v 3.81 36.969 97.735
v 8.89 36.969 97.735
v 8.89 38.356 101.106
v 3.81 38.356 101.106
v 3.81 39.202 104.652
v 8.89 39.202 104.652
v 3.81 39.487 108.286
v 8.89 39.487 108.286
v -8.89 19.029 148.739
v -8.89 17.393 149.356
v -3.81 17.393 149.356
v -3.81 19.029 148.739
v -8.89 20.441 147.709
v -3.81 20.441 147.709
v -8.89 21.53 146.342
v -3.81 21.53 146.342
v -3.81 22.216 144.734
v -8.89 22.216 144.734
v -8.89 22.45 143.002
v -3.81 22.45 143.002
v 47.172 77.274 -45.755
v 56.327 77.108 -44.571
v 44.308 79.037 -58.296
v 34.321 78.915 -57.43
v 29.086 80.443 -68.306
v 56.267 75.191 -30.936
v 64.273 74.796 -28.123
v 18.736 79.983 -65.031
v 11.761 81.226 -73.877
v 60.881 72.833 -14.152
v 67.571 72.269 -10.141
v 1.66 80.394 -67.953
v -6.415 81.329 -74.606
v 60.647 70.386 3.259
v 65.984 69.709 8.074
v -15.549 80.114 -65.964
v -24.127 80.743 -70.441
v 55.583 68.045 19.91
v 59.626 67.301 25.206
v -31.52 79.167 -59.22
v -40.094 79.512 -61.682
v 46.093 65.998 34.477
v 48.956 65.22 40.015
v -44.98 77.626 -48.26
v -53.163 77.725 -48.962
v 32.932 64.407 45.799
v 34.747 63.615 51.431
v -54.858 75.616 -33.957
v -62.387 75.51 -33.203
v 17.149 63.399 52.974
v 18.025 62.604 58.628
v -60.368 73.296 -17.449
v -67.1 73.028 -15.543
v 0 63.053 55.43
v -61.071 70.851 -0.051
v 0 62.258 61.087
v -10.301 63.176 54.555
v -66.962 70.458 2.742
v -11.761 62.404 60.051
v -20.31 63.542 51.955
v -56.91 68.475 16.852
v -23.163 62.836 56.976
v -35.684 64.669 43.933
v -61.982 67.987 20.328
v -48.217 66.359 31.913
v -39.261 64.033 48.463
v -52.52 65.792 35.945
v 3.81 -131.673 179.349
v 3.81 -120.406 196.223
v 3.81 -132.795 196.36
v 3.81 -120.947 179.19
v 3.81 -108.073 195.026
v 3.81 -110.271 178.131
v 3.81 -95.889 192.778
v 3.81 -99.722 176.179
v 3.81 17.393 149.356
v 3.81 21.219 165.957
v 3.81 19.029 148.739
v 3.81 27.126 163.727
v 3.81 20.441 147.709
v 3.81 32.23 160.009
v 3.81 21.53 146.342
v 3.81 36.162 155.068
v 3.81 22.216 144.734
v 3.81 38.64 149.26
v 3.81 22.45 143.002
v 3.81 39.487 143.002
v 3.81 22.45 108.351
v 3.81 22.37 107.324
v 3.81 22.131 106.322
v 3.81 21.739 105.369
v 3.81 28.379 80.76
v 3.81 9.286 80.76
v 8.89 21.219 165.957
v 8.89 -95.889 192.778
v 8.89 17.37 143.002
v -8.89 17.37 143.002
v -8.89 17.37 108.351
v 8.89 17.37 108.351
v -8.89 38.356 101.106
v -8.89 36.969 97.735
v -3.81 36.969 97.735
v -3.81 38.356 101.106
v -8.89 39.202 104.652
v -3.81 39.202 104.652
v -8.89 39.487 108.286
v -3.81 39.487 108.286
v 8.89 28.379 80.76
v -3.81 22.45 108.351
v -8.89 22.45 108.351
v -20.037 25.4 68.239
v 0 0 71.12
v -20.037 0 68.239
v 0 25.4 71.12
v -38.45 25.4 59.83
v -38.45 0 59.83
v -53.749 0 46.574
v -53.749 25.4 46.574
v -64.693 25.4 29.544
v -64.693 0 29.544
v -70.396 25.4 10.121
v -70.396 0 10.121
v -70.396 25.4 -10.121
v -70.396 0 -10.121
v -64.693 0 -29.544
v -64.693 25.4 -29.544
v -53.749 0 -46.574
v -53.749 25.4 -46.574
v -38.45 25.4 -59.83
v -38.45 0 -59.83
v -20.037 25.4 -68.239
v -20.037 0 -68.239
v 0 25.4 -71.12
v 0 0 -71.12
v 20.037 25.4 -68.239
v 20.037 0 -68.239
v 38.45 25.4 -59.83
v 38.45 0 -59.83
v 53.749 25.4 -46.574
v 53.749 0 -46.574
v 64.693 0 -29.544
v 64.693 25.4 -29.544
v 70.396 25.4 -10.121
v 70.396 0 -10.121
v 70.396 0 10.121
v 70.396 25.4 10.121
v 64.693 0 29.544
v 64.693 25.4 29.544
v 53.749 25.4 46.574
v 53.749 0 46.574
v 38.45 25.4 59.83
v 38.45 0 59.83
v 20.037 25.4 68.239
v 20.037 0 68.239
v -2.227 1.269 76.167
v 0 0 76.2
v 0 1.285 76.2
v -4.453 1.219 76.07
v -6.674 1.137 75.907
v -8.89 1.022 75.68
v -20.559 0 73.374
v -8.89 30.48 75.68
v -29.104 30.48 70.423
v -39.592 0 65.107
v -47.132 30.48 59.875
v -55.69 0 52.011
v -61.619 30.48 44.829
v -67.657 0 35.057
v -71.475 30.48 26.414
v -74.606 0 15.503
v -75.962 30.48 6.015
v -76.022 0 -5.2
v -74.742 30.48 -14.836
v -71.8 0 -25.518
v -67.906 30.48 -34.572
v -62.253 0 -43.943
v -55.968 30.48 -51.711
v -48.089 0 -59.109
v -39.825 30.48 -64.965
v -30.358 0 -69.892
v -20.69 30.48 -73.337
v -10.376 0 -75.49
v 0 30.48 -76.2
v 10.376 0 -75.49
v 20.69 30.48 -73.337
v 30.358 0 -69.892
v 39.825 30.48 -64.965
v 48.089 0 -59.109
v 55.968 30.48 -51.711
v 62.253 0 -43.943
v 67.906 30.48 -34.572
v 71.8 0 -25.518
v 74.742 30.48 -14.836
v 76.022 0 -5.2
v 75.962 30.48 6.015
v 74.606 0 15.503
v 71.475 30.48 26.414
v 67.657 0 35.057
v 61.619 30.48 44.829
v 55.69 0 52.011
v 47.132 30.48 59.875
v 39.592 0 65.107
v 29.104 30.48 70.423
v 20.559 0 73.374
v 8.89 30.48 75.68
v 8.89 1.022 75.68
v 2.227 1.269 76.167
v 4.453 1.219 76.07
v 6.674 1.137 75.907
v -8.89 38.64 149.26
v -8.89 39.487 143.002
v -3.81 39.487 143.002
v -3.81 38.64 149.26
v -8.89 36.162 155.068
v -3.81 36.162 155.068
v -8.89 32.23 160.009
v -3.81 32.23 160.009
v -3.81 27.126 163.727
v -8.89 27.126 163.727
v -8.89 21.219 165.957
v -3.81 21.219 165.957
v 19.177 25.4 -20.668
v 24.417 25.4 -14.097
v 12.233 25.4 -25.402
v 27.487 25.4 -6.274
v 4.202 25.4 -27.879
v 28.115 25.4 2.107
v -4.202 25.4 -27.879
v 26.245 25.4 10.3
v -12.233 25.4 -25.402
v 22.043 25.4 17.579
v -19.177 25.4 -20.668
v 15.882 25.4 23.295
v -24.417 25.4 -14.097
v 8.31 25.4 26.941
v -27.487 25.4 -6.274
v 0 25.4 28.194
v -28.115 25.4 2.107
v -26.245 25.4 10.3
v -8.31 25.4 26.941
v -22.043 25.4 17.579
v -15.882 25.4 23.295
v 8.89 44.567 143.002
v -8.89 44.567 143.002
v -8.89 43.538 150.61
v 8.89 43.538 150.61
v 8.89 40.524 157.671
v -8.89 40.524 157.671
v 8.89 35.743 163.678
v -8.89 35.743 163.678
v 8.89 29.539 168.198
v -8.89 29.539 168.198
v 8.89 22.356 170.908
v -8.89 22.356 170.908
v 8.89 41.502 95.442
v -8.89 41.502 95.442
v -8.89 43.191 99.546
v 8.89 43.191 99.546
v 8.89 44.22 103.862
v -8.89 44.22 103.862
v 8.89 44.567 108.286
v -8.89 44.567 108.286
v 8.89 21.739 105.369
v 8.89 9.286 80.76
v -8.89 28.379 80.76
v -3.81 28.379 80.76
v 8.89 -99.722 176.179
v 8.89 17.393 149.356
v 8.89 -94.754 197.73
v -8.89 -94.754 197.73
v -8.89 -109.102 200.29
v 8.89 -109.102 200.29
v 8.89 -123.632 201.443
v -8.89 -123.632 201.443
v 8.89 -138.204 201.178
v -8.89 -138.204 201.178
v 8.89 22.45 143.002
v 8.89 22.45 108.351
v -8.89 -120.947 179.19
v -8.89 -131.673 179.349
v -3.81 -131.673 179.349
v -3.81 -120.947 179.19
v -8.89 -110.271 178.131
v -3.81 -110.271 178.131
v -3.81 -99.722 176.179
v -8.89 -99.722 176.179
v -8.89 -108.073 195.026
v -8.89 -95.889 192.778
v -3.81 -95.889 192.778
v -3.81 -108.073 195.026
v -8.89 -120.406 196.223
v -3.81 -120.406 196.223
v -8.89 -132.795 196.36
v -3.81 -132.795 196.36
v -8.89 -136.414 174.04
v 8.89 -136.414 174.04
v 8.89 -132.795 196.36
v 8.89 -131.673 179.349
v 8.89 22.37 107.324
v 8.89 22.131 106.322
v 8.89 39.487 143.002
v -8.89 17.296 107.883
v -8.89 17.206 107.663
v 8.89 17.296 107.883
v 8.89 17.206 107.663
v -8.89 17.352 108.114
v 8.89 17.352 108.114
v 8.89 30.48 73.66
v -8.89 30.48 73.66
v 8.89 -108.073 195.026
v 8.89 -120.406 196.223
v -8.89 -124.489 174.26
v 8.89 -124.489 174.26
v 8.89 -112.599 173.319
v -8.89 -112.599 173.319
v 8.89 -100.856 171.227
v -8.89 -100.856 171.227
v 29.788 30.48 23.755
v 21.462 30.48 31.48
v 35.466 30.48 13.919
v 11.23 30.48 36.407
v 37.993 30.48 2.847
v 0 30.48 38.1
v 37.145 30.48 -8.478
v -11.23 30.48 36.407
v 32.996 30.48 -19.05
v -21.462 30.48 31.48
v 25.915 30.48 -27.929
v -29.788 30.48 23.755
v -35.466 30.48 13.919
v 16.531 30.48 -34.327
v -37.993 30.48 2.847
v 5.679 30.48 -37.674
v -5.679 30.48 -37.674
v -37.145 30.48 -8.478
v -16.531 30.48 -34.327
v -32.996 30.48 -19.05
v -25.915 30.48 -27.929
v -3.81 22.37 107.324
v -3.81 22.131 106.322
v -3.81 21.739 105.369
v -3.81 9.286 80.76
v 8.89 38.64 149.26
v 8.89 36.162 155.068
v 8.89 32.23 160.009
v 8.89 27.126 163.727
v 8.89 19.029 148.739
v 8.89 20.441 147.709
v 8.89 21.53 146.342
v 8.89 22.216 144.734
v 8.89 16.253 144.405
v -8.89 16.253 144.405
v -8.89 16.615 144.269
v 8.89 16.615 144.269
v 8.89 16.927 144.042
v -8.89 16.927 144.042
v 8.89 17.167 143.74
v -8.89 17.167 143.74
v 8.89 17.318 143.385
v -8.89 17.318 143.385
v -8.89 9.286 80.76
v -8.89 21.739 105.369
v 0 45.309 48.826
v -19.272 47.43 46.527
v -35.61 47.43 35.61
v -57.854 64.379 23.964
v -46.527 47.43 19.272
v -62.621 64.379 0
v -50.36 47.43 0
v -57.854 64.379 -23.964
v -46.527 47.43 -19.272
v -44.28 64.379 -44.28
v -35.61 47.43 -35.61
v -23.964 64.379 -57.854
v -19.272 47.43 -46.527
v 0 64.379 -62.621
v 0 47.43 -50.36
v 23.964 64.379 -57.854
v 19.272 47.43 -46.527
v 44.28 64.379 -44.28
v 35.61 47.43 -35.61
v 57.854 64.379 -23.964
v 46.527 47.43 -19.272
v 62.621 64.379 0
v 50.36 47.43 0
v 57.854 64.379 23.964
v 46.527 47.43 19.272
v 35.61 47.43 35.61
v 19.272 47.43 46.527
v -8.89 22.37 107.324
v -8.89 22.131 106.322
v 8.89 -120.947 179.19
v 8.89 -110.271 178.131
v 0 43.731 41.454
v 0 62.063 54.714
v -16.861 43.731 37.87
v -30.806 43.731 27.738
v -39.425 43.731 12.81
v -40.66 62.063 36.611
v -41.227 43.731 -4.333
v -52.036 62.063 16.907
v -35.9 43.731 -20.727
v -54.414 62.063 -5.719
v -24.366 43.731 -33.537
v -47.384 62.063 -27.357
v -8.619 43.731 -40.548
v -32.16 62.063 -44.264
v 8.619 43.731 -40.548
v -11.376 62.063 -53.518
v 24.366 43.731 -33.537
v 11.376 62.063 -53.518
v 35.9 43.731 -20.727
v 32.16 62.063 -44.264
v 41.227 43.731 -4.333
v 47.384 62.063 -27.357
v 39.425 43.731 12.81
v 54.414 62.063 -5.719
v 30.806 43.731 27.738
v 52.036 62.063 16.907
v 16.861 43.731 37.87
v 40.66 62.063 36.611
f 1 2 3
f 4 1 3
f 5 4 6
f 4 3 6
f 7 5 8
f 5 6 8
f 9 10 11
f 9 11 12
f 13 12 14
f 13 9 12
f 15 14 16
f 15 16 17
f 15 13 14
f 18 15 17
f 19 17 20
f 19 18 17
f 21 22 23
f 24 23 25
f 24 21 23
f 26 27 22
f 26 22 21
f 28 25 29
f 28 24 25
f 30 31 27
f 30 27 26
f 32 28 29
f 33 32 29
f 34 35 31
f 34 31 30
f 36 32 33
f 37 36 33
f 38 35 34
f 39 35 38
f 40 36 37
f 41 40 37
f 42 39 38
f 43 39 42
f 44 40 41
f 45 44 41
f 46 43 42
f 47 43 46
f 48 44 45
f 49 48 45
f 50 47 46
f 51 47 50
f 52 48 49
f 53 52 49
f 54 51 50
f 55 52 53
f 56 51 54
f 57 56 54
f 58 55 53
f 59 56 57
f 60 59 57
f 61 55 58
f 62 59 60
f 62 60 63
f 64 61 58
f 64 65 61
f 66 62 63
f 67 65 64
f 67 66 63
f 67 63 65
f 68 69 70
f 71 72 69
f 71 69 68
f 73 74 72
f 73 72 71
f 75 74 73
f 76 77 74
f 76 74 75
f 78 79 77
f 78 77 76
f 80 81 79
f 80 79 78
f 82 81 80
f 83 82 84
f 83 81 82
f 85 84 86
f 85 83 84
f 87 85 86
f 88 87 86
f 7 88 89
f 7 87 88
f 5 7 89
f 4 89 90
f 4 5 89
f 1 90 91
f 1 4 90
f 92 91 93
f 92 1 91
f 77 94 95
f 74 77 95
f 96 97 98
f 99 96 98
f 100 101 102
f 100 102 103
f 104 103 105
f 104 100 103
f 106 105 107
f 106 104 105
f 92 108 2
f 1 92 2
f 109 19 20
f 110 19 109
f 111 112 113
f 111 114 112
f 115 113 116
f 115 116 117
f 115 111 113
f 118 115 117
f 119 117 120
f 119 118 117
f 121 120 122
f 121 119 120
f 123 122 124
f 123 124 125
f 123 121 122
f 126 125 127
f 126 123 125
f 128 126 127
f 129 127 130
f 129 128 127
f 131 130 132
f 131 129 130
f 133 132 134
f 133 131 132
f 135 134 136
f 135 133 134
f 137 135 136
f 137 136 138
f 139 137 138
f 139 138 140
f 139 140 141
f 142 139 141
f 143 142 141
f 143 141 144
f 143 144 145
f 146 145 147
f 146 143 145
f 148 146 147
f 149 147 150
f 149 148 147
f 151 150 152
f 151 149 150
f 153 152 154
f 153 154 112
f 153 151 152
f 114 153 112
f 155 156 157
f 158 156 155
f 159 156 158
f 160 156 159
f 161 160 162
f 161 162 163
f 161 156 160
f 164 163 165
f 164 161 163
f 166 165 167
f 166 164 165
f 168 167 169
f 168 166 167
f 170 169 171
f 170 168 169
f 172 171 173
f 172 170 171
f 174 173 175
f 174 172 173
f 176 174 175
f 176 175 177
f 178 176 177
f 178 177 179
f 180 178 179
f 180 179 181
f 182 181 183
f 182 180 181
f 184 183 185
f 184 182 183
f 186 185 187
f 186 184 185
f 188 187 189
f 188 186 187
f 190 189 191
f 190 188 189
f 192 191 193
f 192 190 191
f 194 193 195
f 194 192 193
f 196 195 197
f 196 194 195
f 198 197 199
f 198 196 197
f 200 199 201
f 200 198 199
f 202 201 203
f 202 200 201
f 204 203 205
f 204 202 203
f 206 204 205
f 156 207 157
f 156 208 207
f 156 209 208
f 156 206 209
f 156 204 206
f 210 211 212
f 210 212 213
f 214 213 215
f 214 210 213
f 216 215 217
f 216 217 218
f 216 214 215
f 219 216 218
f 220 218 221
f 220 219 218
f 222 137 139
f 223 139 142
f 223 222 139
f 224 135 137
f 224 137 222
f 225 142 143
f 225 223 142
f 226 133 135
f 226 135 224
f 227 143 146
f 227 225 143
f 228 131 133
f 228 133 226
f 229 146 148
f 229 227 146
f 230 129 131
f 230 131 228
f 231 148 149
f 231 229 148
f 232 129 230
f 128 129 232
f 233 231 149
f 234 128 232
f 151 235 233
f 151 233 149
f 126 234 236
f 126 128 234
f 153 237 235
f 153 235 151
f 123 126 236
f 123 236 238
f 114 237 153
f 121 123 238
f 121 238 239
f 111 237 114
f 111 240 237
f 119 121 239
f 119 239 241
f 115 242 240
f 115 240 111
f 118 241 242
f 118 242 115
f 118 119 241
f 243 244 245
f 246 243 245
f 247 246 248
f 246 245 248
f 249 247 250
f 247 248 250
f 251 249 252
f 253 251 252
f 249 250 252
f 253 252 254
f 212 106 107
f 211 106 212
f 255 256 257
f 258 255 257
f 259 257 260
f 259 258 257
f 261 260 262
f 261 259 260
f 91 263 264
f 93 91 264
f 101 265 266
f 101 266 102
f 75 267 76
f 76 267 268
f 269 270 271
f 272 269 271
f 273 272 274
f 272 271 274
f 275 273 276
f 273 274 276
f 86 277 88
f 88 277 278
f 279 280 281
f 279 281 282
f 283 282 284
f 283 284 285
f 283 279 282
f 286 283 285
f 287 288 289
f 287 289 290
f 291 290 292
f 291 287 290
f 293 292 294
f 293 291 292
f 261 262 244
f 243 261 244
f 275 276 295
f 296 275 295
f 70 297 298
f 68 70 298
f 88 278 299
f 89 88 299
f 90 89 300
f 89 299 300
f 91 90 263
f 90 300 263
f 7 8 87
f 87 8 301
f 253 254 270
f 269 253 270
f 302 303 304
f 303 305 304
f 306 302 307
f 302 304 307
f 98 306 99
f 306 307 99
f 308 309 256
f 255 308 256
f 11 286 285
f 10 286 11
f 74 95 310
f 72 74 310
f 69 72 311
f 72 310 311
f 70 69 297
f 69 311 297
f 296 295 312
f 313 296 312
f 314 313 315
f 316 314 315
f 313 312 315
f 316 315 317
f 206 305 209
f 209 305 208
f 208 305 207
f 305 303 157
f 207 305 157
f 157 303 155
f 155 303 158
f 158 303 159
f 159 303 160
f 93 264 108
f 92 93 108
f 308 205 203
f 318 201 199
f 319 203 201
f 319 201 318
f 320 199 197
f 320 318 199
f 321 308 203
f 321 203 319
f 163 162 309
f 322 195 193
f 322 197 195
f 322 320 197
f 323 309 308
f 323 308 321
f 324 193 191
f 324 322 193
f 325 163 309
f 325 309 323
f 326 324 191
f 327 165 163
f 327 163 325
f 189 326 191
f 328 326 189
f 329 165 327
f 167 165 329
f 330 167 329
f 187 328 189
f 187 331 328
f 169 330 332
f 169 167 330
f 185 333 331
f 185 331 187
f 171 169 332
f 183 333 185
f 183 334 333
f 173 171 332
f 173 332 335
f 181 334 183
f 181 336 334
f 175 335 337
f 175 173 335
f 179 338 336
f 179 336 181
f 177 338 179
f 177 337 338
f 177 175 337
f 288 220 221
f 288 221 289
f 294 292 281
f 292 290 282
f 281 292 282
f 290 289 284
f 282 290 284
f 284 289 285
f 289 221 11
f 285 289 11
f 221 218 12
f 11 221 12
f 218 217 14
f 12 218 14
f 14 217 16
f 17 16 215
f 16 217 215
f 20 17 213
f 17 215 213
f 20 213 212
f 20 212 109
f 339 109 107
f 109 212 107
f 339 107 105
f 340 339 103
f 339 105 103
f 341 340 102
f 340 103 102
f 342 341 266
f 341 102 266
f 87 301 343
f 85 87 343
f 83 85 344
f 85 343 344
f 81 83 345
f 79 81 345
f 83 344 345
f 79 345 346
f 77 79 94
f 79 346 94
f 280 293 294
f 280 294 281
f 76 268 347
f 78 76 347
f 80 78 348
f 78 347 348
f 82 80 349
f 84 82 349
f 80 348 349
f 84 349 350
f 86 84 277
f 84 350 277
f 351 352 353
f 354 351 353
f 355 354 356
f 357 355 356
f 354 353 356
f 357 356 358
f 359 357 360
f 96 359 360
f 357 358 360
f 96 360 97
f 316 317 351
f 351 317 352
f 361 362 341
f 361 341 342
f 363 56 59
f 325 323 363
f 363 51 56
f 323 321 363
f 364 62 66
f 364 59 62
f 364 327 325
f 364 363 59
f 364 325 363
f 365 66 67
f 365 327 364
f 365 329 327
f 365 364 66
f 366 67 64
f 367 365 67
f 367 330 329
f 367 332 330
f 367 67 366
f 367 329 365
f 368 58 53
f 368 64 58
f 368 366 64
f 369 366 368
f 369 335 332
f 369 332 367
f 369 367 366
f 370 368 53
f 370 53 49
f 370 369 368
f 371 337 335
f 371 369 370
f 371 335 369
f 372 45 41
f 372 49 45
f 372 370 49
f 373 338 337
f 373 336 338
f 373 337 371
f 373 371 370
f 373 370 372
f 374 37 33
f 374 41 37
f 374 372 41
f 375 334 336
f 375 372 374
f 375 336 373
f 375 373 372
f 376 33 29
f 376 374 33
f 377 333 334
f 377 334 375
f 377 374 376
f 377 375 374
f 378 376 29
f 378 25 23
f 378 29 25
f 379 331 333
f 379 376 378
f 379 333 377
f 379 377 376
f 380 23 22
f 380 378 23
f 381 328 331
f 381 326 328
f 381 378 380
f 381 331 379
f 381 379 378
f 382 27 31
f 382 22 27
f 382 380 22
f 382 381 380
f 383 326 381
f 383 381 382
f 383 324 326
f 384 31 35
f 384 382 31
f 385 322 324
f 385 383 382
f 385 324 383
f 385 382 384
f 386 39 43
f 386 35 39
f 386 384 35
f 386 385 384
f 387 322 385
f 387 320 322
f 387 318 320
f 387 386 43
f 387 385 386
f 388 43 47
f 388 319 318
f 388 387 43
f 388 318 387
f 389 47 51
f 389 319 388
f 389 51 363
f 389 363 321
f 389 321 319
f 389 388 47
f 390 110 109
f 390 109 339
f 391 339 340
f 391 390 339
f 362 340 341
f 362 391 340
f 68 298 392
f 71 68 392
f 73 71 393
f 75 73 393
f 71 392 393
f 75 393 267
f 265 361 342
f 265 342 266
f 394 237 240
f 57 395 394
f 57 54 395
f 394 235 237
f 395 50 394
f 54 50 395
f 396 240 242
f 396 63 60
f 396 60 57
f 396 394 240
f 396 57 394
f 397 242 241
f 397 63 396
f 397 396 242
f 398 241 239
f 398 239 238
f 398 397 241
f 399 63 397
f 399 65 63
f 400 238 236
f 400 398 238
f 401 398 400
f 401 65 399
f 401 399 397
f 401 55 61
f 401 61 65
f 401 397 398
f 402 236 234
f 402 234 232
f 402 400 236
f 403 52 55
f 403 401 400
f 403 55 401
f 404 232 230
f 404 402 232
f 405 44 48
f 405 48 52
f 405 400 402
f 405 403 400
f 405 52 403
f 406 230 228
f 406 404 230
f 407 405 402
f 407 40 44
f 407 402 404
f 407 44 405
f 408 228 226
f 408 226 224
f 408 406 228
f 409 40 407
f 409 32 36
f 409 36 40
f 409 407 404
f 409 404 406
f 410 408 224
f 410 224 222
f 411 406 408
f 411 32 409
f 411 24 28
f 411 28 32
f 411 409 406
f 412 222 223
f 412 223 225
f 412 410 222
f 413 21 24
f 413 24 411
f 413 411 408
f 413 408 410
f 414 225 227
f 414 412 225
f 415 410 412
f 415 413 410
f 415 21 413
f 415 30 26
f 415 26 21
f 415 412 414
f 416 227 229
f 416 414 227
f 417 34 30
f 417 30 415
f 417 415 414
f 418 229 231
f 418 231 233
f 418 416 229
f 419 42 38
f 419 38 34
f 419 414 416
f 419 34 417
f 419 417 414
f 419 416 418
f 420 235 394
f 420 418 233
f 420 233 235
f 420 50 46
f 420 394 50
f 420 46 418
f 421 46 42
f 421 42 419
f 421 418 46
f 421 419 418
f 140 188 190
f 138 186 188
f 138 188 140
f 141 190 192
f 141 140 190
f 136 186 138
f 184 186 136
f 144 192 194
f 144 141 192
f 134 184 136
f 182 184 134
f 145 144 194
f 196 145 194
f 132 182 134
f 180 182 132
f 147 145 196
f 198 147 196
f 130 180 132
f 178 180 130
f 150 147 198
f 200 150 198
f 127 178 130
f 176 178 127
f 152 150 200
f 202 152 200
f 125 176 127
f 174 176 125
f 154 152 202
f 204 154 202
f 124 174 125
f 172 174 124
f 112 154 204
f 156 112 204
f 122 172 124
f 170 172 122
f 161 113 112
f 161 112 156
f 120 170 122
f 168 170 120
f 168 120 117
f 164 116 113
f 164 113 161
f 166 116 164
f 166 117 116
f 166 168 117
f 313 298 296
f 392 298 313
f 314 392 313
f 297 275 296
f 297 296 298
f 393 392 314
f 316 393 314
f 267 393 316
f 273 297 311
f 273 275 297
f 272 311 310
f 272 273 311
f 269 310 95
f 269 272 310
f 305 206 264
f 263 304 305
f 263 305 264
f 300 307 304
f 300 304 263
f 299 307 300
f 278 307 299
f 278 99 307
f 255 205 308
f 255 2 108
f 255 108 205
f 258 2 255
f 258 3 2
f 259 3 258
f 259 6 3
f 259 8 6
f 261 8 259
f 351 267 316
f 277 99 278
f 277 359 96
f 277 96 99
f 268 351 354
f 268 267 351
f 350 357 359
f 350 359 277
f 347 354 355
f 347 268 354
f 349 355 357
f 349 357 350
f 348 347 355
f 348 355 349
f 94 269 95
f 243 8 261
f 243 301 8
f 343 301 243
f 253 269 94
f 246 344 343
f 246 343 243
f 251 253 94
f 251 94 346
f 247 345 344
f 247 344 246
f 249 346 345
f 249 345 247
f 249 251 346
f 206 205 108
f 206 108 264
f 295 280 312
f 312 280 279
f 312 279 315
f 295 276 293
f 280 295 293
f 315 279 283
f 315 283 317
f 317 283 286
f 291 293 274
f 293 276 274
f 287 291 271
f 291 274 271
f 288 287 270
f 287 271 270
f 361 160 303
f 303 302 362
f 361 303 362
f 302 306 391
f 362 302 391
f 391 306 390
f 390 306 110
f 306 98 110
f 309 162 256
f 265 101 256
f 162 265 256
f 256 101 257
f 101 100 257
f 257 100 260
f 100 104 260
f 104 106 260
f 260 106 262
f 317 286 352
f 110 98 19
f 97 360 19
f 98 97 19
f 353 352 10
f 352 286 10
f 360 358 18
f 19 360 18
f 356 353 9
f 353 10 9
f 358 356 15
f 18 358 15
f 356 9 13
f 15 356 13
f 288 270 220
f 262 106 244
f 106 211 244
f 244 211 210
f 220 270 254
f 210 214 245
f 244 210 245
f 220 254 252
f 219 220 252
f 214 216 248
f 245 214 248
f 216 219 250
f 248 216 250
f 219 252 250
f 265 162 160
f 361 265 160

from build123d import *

# Parameters (mm, degrees)
SWEEP2_START       = -8.89
SWEEP2_DEPTH       = 17.78
FILLET1_R          = 28.448
FILLET2_R          = 1.524
CUT_EXTRUDE1_DEPTH = 5.08


with BuildPart() as part:
    # Sketch1 → Revolve1 (revolve)
    with BuildSketch(Plane.XY, mode=Mode.PRIVATE) as revolve1_sk:
        Polygon((71.12, 25.4), (28.194, 25.4), (68.685755738, 81.378294554), (75.018953762, 81.51903327), (38.1, 30.48), (76.2, 30.48), (76.2, 0), (71.12, 0), align=None)
    revolve(revolve1_sk.sketch.rotate(Axis((0, 85.716301318, 0), (0, -1, 0)), 90), axis=Axis((0, 85.716301318, 0), (0, -1, 0)))

    # SurfaceCut1
    split(bisect_by=Plane(origin=(0, 69.471471591, 9.763578605), x_dir=(-1, 0, 0), z_dir=(0, 0.9902680687415703, 0.13917310096006574)), keep=Keep.BOTTOM)

    # Sweep2: read off the stored shape, not the designer's step
    # Sweep2 outline → Sweep2 (add)
    with BuildSketch(Plane.YZ.offset(SWEEP2_START)):
        with BuildLine():
            Line((17.370160471, 143.002), (17.370160471, 107.987503449))
            Line((17.370160471, 107.987503449), (1.021963911, 75.67963993))
            Line((1.021963911, 75.67963993), (30.48, 75.67963993))
            Line((30.48, 75.67963993), (30.48, 73.66))
            Line((30.48, 73.66), (44.566575341, 101.498370543))
            Line((44.566575341, 101.498370543), (44.566575341, 143.002))
            ThreePointArc((44.566575341, 143.002), (38.336028216, 160.835083682), (22.355619148, 170.908073165))
            Line((22.355619148, 170.908073165), (-94.754140244, 197.729788602))
            ThreePointArc((-94.754140244, 197.729788602), (-116.352888931, 201.043440298), (-138.203933305, 201.177947268))
            Line((-138.203933305, 201.177947268), (-136.414333354, 174.040476608))
            ThreePointArc((-136.414333354, 174.040476608), (-118.532403269, 173.934498987), (-100.856344498, 171.226806034))
            Line((-100.856344498, 171.226806034), (16.253414894, 144.405090597))
            ThreePointArc((16.253414894, 144.405090597), (17.056894537, 143.898630346), (17.370160471, 143.002))
        make_face()
    extrude(amount=SWEEP2_DEPTH)

    # Fillet1
    fillet1_edges = [part.edges().sort_by_distance(p)[0] for p in [
        (0, 44.566575341, 101.498370543),
    ]]
    fillet(fillet1_edges, radius=FILLET1_R)

    # Fillet2
    fillet2_edges = [part.edges().sort_by_distance(p)[0] for p in [
        (0, 17.370160471, 107.987503449),
    ]]
    fillet(fillet2_edges, radius=FILLET2_R)

    # Sketch7 → Cut-Extrude1 (cut)
    with BuildSketch(Plane(origin=(8.89, 0, 0), x_dir=(0, 0, -1), z_dir=(1, 0, 0))):
        with BuildLine():
            Line((-80.75963993, 9.28584823), (-80.75963993, 28.379170924))
            Line((-80.75963993, 28.379170924), (-97.73546941, 36.969160074))
            ThreePointArc((-97.73546941, 36.969160074), (-102.862715222, 38.848510317), (-108.286134805, 39.486575341))
            Line((-108.286134805, 39.486575341), (-143.002, 39.486575341))
            ThreePointArc((-143.002, 39.486575341), (-157.670443725, 34.362181678), (-165.956972893, 21.218510727))
            Line((-165.956972893, 21.218510727), (-192.778140508, -95.888856575))
            ThreePointArc((-192.778140508, -95.888856575), (-195.756406443, -114.226762874), (-196.359610136, -132.795150546))
            Line((-196.359610136, -132.795150546), (-179.348953739, -131.673370618))
            ThreePointArc((-179.348953739, -131.673370618), (-178.772717763, -115.597689457), (-176.178592901, -99.722233909))
            Line((-176.178592901, -99.722233909), (-149.355564845, 17.393241513))
            ThreePointArc((-149.355564845, 17.393241513), (-147.062179047, 21.031609572), (-143.002, 22.450160471))
            Line((-143.002, 22.450160471), (-108.351133677, 22.450160471))
            ThreePointArc((-108.351133677, 22.450160471), (-106.818428143, 22.269837747), (-105.369423892, 21.738717026))
            Line((-105.369423892, 21.738717026), (-80.75963993, 9.28584823))
        make_face()
    cut_extrude1 = extrude(amount=-CUT_EXTRUDE1_DEPTH, mode=Mode.SUBTRACT)

    # Mirror2: Cut-Extrude1 across plane
    add(cut_extrude1.mirror(Plane(origin=(0, 0, 0), x_dir=(0, 0, 1), z_dir=(1, 0, 0))), mode=Mode.SUBTRACT)


solid = part.part
